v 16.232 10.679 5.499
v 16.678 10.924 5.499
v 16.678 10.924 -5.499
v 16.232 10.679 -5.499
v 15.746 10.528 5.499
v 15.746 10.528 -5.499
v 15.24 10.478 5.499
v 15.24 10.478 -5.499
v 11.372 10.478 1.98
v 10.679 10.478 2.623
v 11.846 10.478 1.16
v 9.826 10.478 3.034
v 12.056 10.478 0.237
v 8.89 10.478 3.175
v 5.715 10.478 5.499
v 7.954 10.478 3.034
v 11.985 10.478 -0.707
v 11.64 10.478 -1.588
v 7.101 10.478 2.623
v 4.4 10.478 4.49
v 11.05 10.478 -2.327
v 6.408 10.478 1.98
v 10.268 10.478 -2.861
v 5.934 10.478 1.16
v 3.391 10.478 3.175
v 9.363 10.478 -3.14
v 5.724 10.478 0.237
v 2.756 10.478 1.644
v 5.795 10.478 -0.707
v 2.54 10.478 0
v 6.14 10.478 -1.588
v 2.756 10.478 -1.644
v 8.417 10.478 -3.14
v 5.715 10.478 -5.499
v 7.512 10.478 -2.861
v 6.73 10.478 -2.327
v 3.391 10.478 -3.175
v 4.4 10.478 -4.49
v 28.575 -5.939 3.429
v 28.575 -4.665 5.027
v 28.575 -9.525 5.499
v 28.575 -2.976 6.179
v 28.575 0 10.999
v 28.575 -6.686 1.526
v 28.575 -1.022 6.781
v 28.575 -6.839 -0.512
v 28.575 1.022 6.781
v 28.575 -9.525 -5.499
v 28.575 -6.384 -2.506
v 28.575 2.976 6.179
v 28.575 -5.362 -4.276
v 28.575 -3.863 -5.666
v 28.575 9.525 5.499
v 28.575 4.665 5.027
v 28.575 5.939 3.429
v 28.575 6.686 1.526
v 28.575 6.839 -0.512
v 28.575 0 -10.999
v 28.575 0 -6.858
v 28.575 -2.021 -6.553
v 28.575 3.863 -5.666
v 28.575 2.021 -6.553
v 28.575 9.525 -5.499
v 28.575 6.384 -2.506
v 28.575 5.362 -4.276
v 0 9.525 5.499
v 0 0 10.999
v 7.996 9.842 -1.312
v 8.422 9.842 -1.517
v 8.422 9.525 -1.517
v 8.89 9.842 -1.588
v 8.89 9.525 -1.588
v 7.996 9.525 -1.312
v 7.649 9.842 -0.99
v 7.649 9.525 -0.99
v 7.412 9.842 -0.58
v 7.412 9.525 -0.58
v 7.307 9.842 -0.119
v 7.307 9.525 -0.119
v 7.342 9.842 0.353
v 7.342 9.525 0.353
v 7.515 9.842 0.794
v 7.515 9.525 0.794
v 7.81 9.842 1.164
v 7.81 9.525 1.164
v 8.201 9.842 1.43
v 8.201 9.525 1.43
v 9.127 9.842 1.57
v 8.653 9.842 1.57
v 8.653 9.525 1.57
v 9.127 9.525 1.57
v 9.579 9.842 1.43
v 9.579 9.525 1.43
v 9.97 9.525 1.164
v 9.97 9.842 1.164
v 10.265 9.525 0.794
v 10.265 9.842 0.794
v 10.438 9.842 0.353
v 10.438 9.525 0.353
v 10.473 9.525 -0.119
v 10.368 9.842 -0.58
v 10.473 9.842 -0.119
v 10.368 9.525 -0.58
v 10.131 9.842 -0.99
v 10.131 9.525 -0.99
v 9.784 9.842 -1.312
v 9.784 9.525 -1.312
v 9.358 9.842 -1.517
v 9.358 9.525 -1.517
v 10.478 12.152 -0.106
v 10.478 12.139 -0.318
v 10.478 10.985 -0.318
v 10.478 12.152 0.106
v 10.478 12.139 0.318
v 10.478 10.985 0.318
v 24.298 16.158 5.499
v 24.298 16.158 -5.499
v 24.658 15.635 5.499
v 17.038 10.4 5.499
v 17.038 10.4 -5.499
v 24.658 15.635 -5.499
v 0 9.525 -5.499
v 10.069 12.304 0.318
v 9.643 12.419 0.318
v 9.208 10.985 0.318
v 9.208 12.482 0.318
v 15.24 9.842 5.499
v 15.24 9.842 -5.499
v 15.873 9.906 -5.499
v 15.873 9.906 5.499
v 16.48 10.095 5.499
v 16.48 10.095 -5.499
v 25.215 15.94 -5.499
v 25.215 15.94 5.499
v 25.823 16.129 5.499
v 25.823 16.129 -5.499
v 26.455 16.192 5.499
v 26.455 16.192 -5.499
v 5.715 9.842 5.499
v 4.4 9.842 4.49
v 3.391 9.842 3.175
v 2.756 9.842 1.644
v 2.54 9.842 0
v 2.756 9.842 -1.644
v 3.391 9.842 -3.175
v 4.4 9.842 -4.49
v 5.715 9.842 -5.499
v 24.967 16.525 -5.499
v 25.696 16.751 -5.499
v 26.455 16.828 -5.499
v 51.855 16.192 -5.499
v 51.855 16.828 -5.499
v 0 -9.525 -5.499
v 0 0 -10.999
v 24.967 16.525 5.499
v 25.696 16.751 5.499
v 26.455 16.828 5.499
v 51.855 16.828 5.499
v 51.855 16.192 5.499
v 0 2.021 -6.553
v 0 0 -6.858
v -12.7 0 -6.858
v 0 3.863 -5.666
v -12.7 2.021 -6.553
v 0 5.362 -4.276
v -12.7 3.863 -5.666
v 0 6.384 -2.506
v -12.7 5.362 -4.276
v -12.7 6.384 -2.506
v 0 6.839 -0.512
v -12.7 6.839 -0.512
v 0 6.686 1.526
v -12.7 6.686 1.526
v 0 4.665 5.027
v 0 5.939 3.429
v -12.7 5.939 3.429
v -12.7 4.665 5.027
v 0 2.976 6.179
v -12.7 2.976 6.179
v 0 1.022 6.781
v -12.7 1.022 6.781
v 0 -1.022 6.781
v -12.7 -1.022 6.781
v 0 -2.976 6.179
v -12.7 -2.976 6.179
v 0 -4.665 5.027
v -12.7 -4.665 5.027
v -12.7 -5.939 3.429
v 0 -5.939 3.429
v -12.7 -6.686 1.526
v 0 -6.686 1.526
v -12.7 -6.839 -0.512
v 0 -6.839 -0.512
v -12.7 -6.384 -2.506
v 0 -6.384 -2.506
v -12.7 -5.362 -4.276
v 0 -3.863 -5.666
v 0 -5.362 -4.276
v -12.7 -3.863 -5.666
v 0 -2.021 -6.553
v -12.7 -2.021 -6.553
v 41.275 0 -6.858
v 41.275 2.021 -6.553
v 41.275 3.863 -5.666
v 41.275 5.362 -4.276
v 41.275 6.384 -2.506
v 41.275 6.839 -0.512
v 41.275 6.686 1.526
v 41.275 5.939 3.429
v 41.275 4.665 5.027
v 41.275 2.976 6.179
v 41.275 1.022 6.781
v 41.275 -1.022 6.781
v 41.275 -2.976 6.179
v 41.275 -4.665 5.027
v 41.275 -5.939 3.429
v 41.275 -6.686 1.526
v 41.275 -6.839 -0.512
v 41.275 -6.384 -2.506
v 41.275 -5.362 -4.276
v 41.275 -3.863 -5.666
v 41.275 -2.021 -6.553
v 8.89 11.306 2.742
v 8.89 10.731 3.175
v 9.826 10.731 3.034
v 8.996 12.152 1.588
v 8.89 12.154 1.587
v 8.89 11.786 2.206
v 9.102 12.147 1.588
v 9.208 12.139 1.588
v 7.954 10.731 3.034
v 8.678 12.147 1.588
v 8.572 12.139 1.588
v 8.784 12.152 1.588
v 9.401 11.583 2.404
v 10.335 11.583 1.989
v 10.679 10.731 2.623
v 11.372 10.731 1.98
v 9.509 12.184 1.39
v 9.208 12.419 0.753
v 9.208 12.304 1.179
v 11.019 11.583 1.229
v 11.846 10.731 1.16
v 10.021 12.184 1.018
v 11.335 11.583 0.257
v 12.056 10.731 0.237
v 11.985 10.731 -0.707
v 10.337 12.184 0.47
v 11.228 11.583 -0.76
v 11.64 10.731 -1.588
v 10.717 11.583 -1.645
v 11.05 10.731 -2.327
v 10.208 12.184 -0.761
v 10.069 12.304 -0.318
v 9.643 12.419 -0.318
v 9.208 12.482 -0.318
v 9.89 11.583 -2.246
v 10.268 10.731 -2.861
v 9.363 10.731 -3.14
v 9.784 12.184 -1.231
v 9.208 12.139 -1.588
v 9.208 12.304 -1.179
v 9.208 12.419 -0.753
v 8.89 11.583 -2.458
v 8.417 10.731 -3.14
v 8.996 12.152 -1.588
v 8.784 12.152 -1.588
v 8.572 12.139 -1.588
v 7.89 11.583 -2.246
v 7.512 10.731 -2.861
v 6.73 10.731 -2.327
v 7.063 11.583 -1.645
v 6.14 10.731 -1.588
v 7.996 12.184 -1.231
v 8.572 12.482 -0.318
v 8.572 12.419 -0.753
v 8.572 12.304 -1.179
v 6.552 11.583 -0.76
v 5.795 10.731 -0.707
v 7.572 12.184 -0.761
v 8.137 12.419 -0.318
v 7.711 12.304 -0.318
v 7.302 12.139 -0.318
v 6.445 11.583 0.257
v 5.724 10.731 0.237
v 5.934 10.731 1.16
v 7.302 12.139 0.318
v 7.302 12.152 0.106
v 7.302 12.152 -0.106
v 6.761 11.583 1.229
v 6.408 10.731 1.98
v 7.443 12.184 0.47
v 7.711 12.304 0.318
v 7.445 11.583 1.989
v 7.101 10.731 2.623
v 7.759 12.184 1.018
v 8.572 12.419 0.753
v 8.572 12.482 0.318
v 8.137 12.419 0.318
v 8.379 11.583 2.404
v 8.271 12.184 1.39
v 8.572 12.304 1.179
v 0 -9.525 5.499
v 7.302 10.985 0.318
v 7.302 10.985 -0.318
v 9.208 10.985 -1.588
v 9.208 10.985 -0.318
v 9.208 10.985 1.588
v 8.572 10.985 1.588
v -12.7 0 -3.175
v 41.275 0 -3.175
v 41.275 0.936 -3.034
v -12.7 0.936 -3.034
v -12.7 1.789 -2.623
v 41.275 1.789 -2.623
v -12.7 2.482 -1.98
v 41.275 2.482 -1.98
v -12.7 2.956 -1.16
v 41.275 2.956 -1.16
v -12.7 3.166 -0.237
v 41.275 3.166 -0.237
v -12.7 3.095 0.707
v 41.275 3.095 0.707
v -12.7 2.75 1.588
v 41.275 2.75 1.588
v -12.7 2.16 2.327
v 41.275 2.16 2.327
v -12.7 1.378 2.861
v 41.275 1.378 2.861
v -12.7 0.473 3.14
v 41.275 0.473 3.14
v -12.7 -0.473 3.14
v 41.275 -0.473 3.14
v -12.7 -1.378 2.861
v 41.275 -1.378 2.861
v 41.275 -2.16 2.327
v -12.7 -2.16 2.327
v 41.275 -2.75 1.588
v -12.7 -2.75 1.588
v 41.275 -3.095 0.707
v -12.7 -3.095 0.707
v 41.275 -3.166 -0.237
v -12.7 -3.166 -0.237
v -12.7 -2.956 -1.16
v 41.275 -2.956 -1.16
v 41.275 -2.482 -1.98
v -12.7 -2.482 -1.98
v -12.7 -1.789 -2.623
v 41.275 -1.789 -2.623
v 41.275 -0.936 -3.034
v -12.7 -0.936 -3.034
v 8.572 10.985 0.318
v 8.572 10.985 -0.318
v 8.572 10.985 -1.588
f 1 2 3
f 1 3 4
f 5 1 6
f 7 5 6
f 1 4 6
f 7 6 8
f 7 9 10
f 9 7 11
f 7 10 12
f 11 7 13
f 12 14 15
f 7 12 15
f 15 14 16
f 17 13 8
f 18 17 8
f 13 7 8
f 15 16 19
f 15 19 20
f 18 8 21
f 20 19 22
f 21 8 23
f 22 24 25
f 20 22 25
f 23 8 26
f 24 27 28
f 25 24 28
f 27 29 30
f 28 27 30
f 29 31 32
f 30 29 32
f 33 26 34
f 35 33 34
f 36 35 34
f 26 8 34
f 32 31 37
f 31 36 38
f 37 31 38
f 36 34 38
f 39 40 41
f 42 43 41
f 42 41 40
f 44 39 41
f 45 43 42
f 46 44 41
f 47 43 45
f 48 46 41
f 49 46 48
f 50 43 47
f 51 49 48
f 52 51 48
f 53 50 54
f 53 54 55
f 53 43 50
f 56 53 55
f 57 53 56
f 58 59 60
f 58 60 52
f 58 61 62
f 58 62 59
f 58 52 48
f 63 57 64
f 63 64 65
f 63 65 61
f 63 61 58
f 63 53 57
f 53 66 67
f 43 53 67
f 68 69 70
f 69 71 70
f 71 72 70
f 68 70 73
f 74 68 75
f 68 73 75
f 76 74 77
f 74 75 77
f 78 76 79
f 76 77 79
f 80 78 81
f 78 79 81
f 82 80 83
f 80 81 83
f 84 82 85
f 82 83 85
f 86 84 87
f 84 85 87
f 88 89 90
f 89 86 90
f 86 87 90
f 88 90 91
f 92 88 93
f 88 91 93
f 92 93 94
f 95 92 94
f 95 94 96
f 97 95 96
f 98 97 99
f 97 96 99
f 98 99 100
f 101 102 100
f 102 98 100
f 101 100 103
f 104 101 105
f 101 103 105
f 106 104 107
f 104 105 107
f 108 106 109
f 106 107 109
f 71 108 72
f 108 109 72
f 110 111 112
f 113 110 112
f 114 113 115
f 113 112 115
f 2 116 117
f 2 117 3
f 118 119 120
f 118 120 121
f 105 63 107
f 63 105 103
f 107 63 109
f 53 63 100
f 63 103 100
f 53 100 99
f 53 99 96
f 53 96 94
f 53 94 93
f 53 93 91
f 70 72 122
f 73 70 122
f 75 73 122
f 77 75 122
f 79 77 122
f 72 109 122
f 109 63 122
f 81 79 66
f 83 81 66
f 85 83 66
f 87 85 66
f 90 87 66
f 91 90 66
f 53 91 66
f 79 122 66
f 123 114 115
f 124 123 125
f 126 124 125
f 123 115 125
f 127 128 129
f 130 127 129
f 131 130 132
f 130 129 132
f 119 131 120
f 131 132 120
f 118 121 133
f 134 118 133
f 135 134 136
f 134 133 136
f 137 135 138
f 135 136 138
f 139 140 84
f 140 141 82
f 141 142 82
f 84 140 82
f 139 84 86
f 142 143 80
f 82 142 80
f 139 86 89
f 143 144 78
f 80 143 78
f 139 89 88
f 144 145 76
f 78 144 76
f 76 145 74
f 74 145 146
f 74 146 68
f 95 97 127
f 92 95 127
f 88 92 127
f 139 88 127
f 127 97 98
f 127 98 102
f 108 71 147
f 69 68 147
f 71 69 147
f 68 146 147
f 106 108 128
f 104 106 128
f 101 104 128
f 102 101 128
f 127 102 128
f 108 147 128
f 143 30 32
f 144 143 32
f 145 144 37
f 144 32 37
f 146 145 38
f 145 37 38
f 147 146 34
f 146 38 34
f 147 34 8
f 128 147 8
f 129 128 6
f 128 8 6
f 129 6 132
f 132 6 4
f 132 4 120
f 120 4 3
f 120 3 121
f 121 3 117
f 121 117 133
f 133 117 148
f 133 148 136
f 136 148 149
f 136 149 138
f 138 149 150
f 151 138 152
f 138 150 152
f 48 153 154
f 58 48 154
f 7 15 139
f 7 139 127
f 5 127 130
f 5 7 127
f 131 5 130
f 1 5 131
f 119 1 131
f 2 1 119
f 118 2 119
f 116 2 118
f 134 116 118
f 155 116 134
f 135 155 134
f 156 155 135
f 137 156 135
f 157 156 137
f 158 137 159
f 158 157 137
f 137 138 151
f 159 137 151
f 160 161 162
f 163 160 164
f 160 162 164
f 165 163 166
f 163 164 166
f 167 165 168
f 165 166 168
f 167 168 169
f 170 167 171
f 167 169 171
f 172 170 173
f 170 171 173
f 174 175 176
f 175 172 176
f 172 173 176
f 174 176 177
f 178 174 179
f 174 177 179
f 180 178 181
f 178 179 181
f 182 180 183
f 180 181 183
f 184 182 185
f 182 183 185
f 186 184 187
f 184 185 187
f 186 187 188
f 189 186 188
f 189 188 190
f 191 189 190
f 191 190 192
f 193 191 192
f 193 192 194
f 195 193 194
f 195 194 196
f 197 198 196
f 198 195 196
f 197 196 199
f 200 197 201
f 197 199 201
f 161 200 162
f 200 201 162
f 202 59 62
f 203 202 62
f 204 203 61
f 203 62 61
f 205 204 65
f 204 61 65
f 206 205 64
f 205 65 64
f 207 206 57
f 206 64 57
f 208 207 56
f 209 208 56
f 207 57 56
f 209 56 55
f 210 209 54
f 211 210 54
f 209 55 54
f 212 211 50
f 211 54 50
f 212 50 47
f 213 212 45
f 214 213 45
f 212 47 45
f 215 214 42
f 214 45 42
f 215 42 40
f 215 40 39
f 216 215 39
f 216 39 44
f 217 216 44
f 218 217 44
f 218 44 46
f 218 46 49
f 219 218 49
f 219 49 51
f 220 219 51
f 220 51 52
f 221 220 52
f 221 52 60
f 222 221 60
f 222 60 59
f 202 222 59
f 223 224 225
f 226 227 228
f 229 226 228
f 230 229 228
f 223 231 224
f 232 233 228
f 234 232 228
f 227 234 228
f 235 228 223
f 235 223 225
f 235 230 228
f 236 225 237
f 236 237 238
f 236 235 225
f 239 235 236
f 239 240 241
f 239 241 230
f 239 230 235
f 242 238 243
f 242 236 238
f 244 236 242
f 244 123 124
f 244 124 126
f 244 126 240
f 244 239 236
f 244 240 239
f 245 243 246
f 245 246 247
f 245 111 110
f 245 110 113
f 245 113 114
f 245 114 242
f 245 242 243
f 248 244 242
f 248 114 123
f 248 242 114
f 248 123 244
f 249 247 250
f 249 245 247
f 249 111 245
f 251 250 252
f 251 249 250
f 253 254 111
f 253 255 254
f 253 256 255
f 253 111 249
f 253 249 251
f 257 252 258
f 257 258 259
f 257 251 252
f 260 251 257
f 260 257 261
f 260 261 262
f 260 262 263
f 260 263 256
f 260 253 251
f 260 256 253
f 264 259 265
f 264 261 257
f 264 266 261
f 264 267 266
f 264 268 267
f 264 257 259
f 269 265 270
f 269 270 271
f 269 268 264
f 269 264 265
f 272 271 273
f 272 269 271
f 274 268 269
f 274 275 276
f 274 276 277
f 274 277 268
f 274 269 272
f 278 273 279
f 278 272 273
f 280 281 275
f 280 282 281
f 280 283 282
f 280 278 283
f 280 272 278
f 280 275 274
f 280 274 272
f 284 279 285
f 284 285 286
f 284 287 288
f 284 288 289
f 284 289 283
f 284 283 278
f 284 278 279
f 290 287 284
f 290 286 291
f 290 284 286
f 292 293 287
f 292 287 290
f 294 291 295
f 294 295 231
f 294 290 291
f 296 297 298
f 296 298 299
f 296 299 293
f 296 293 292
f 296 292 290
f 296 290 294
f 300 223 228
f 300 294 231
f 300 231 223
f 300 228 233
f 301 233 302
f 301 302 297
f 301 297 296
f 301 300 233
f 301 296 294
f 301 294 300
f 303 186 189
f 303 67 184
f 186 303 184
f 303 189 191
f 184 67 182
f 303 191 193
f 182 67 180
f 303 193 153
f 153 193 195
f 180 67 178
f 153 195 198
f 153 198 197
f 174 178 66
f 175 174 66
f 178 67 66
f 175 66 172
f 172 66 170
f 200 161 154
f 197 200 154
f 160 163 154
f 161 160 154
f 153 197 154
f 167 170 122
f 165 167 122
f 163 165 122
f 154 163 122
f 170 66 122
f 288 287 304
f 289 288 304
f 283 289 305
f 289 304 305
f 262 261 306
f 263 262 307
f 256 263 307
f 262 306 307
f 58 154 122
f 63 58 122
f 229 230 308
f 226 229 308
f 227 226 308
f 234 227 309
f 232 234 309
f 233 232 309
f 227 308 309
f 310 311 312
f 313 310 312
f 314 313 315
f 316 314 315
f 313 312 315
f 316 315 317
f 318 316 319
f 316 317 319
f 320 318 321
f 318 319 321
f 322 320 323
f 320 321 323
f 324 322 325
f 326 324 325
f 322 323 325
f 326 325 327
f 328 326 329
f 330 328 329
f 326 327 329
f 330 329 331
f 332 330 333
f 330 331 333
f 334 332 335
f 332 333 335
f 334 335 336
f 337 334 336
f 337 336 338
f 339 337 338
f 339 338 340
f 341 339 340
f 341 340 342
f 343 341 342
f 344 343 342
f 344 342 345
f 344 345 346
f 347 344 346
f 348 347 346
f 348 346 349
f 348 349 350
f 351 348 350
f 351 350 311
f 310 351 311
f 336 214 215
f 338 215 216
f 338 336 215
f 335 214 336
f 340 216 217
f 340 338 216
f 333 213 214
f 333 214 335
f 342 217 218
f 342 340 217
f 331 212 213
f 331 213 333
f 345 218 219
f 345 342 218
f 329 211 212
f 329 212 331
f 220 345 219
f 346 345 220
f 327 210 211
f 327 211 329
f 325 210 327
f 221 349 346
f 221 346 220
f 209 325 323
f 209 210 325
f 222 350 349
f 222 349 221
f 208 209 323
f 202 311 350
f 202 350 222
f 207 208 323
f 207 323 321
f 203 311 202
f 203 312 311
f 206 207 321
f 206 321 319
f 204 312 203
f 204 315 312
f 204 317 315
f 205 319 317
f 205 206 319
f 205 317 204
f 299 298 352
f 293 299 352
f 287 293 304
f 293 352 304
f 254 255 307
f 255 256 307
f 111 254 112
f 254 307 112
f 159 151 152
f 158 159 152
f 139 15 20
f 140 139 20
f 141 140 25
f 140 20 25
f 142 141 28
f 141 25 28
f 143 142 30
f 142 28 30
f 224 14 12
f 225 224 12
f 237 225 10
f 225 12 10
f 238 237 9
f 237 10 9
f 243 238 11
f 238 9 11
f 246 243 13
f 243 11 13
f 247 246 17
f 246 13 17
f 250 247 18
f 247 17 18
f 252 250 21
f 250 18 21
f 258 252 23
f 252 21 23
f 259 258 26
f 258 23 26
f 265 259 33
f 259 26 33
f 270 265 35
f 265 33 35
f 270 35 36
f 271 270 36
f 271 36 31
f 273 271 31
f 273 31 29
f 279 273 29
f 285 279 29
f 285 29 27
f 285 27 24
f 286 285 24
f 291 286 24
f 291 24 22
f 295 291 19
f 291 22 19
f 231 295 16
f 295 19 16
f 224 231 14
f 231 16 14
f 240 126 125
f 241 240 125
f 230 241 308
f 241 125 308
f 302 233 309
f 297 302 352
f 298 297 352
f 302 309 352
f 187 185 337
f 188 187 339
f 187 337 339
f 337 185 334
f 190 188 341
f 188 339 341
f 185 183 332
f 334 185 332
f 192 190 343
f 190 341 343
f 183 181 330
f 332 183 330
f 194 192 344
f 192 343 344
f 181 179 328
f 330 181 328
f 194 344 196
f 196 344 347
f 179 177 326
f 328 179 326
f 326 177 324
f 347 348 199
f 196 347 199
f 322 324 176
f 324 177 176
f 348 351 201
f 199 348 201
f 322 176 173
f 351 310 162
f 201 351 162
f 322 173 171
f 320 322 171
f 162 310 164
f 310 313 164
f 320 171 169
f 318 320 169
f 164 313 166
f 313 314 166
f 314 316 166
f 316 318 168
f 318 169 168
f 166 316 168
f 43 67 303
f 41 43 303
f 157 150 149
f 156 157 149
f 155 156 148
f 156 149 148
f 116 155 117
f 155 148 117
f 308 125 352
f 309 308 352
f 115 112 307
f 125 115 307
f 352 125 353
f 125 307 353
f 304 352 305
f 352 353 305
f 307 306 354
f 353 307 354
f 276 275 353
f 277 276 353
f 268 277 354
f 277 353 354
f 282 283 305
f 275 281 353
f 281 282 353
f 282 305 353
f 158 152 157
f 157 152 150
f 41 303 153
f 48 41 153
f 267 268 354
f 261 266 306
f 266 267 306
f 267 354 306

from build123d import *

# Parameters (mm, degrees)
BOSS_EXTRUDE1_DEPTH         = 28.575
BOSS_EXTRUDE2_DEPTH         = 12.7
BOSS_EXTRUDE2_DEPTH_BACK    = 41.275
SKETCH2_R                   = 6.858
F_1_4_0_25_DIAMETER_HOLE1_D = 6.35
BOSS_EXTRUDE3_DEPTH         = 5.499261
BOSS_EXTRUDE3_DEPTH_BACK    = 5.499261
CUT_EXTRUDE2_DEPTH          = 0.635
SKETCH8_R                   = 3.175
BOSS_EXTRUDE4_DEPTH         = 0.254
DOME1_FACE_RADIUS           = 3.175
DOME1_HEIGHT                = 1.778
CUT_EXTRUDE3_REACH          = 59.165
CUT_EXTRUDE3_END_RADIUS     = 3.723821429
CUT_EXTRUDE3_START          = 0.508
BOSS_EXTRUDE5_REACH         = 58.328
SKETCH10_R                  = 1.5875


with BuildPart() as part:
    # Sketch1 → Boss-Extrude1 (new body)
    with BuildSketch(Plane(origin=(0, 0, 0), x_dir=(0, 0, -1), z_dir=(1, 0, 0))):
        Polygon((10.998522628, 0), (5.499261314, 9.525), (-5.499261314, 9.525), (-10.998522628, 0), (-5.499261314, -9.525), (5.499261314, -9.525), align=None)
    extrude(amount=BOSS_EXTRUDE1_DEPTH)

    # Sketch2 → Boss-Extrude2 (add, two sides: drawn at the far end of the back side and taken through both)
    with BuildSketch(Plane(origin=(28.575, 0, 0), x_dir=(0, 0, -1), z_dir=(1, 0, 0)).offset(-BOSS_EXTRUDE2_DEPTH_BACK)):
        Circle(SKETCH2_R)
    extrude(amount=BOSS_EXTRUDE2_DEPTH + BOSS_EXTRUDE2_DEPTH_BACK)

    # 1/4 (0.25) Diameter Hole1 (through all)
    with Locations(Plane.ZY.offset(12.7)):
        with Locations((0, 0)):
            Hole(F_1_4_0_25_DIAMETER_HOLE1_D / 2)


with BuildPart() as body_2:
    # Sketch6 → Boss-Extrude3 (new, two sides: drawn at the far end of the back side and taken through both)
    with BuildSketch(Plane.XY.offset(-BOSS_EXTRUDE3_DEPTH_BACK)):
        with BuildLine():
            Line((2.54, 9.8425), (15.24, 9.8425))
            ThreePointArc((15.24, 9.8425), (16.181122428, 9.98518841), (17.037654453, 10.400428456))
            Line((17.037654453, 10.400428456), (24.657654453, 15.634571544))
            ThreePointArc((24.657654453, 15.634571544), (25.514186479, 16.04981159), (26.455308906, 16.1925))
            Line((26.455308906, 16.1925), (51.855308906, 16.1925))
            Line((51.855308906, 16.1925), (51.855308906, 16.8275))
            Line((51.855308906, 16.8275), (26.455308906, 16.8275))
            ThreePointArc((26.455308906, 16.8275), (25.325961993, 16.656273907), (24.298123563, 16.157985853))
            Line((24.298123563, 16.157985853), (16.678123563, 10.923842765))
            ThreePointArc((16.678123563, 10.923842765), (15.992897942, 10.591650728), (15.24, 10.4775))
            Line((15.24, 10.4775), (2.54, 10.4775))
            Line((2.54, 10.4775), (2.54, 9.8425))
        make_face()
    extrude(amount=BOSS_EXTRUDE3_DEPTH + BOSS_EXTRUDE3_DEPTH_BACK)

    # Sketch7 → Cut-Extrude2 (cut)
    with BuildSketch(Plane(origin=(0, 10.4775, 0), x_dir=(1, 0, 0), z_dir=(0, 1, 0))):
        with BuildLine():
            Line((2.54, 5.499261314), (2.54, 0))
            ThreePointArc((2.54, 0), (3.390738686, 3.175), (5.715, 5.499261314))
            Line((5.715, 5.499261314), (2.54, 5.499261314))
        make_face()
        with BuildLine():
            Line((2.54, 0), (2.54, -5.499261314))
            Line((2.54, -5.499261314), (5.715, -5.499261314))
            ThreePointArc((5.715, -5.499261314), (3.390738686, -3.175), (2.54, 0))
        make_face()
    extrude(amount=-CUT_EXTRUDE2_DEPTH, mode=Mode.SUBTRACT)

    # Sketch8 → Boss-Extrude4 (add)
    with BuildSketch(Plane(origin=(0, 10.4775, 0), x_dir=(1, 0, 0), z_dir=(0, 1, 0))):
        with Locations(Location((8.89, 0, 0), (0, 0, 270))):
            Circle(SKETCH8_R)
    extrude(amount=BOSS_EXTRUDE4_DEPTH)

    # Dome1: a dome of height H over a round flat face of radius A is a cap of a sphere of radius (A * A + H * H) / (2 * H)
    dome1_r = (DOME1_FACE_RADIUS * DOME1_FACE_RADIUS + DOME1_HEIGHT * DOME1_HEIGHT) / (2 * DOME1_HEIGHT)
    dome1_base = Plane((8.89, 10.7315, 0), z_dir=(0, 1, 0))
    with Locations(dome1_base.offset(DOME1_HEIGHT - dome1_r)):
        dome1_ball = Sphere(dome1_r, mode=Mode.PRIVATE)
    add(split(dome1_ball, bisect_by=dome1_base, keep=Keep.TOP, mode=Mode.PRIVATE))

    # Cut-Extrude3: up to this sphere (the profile starts inside it)
    cut_extrude3_end = Location((8.89, 8.785678571, 0)) * Sphere(CUT_EXTRUDE3_END_RADIUS, mode=Mode.PRIVATE)
    # Sketch9 → Cut-Extrude3 (cut, up to the surface)
    with BuildSketch(Plane(origin=(0, 10.4775, 0), x_dir=(1, 0, 0), z_dir=(0, 1, 0)).offset(CUT_EXTRUDE3_START), mode=Mode.PRIVATE) as cut_extrude3_sk1:
        Polygon((8.5725, 1.5875), (9.2075, 1.5875), (9.2075, 0.3175), (10.4775, 0.3175), (10.4775, -0.3175), (9.2075, -0.3175), (9.2075, -1.5875), (8.5725, -1.5875), (8.5725, -0.3175), (7.3025, -0.3175), (7.3025, 0.3175), (8.5725, 0.3175), align=None)
    cut_extrude3_tool1 = extrude(cut_extrude3_sk1.sketch, amount=CUT_EXTRUDE3_REACH, mode=Mode.PRIVATE) & cut_extrude3_end
    add(cut_extrude3_tool1.solids().sort_by_distance((8.89, 10.9855, 0))[0], mode=Mode.SUBTRACT)

    # Sketch10 → Boss-Extrude5 (add, up to next)
    with BuildSketch(Plane(origin=(0, 9.525, 0), x_dir=(1, 0, 0), z_dir=(0, 1, 0)), mode=Mode.PRIVATE) as boss_extrude5_sk1:
        with Locations(Location((8.89, 0, 0), (0, 0, 90))):
            Circle(SKETCH10_R)
    boss_extrude5_tool1 = extrude(boss_extrude5_sk1.sketch, amount=BOSS_EXTRUDE5_REACH, mode=Mode.PRIVATE) - body_2.part

    add(part.part)  # Boss-Extrude5 merges part
    add(boss_extrude5_tool1.solids().sort_by_distance((8.89, 9.525, 0))[0])


solid = body_2.part
